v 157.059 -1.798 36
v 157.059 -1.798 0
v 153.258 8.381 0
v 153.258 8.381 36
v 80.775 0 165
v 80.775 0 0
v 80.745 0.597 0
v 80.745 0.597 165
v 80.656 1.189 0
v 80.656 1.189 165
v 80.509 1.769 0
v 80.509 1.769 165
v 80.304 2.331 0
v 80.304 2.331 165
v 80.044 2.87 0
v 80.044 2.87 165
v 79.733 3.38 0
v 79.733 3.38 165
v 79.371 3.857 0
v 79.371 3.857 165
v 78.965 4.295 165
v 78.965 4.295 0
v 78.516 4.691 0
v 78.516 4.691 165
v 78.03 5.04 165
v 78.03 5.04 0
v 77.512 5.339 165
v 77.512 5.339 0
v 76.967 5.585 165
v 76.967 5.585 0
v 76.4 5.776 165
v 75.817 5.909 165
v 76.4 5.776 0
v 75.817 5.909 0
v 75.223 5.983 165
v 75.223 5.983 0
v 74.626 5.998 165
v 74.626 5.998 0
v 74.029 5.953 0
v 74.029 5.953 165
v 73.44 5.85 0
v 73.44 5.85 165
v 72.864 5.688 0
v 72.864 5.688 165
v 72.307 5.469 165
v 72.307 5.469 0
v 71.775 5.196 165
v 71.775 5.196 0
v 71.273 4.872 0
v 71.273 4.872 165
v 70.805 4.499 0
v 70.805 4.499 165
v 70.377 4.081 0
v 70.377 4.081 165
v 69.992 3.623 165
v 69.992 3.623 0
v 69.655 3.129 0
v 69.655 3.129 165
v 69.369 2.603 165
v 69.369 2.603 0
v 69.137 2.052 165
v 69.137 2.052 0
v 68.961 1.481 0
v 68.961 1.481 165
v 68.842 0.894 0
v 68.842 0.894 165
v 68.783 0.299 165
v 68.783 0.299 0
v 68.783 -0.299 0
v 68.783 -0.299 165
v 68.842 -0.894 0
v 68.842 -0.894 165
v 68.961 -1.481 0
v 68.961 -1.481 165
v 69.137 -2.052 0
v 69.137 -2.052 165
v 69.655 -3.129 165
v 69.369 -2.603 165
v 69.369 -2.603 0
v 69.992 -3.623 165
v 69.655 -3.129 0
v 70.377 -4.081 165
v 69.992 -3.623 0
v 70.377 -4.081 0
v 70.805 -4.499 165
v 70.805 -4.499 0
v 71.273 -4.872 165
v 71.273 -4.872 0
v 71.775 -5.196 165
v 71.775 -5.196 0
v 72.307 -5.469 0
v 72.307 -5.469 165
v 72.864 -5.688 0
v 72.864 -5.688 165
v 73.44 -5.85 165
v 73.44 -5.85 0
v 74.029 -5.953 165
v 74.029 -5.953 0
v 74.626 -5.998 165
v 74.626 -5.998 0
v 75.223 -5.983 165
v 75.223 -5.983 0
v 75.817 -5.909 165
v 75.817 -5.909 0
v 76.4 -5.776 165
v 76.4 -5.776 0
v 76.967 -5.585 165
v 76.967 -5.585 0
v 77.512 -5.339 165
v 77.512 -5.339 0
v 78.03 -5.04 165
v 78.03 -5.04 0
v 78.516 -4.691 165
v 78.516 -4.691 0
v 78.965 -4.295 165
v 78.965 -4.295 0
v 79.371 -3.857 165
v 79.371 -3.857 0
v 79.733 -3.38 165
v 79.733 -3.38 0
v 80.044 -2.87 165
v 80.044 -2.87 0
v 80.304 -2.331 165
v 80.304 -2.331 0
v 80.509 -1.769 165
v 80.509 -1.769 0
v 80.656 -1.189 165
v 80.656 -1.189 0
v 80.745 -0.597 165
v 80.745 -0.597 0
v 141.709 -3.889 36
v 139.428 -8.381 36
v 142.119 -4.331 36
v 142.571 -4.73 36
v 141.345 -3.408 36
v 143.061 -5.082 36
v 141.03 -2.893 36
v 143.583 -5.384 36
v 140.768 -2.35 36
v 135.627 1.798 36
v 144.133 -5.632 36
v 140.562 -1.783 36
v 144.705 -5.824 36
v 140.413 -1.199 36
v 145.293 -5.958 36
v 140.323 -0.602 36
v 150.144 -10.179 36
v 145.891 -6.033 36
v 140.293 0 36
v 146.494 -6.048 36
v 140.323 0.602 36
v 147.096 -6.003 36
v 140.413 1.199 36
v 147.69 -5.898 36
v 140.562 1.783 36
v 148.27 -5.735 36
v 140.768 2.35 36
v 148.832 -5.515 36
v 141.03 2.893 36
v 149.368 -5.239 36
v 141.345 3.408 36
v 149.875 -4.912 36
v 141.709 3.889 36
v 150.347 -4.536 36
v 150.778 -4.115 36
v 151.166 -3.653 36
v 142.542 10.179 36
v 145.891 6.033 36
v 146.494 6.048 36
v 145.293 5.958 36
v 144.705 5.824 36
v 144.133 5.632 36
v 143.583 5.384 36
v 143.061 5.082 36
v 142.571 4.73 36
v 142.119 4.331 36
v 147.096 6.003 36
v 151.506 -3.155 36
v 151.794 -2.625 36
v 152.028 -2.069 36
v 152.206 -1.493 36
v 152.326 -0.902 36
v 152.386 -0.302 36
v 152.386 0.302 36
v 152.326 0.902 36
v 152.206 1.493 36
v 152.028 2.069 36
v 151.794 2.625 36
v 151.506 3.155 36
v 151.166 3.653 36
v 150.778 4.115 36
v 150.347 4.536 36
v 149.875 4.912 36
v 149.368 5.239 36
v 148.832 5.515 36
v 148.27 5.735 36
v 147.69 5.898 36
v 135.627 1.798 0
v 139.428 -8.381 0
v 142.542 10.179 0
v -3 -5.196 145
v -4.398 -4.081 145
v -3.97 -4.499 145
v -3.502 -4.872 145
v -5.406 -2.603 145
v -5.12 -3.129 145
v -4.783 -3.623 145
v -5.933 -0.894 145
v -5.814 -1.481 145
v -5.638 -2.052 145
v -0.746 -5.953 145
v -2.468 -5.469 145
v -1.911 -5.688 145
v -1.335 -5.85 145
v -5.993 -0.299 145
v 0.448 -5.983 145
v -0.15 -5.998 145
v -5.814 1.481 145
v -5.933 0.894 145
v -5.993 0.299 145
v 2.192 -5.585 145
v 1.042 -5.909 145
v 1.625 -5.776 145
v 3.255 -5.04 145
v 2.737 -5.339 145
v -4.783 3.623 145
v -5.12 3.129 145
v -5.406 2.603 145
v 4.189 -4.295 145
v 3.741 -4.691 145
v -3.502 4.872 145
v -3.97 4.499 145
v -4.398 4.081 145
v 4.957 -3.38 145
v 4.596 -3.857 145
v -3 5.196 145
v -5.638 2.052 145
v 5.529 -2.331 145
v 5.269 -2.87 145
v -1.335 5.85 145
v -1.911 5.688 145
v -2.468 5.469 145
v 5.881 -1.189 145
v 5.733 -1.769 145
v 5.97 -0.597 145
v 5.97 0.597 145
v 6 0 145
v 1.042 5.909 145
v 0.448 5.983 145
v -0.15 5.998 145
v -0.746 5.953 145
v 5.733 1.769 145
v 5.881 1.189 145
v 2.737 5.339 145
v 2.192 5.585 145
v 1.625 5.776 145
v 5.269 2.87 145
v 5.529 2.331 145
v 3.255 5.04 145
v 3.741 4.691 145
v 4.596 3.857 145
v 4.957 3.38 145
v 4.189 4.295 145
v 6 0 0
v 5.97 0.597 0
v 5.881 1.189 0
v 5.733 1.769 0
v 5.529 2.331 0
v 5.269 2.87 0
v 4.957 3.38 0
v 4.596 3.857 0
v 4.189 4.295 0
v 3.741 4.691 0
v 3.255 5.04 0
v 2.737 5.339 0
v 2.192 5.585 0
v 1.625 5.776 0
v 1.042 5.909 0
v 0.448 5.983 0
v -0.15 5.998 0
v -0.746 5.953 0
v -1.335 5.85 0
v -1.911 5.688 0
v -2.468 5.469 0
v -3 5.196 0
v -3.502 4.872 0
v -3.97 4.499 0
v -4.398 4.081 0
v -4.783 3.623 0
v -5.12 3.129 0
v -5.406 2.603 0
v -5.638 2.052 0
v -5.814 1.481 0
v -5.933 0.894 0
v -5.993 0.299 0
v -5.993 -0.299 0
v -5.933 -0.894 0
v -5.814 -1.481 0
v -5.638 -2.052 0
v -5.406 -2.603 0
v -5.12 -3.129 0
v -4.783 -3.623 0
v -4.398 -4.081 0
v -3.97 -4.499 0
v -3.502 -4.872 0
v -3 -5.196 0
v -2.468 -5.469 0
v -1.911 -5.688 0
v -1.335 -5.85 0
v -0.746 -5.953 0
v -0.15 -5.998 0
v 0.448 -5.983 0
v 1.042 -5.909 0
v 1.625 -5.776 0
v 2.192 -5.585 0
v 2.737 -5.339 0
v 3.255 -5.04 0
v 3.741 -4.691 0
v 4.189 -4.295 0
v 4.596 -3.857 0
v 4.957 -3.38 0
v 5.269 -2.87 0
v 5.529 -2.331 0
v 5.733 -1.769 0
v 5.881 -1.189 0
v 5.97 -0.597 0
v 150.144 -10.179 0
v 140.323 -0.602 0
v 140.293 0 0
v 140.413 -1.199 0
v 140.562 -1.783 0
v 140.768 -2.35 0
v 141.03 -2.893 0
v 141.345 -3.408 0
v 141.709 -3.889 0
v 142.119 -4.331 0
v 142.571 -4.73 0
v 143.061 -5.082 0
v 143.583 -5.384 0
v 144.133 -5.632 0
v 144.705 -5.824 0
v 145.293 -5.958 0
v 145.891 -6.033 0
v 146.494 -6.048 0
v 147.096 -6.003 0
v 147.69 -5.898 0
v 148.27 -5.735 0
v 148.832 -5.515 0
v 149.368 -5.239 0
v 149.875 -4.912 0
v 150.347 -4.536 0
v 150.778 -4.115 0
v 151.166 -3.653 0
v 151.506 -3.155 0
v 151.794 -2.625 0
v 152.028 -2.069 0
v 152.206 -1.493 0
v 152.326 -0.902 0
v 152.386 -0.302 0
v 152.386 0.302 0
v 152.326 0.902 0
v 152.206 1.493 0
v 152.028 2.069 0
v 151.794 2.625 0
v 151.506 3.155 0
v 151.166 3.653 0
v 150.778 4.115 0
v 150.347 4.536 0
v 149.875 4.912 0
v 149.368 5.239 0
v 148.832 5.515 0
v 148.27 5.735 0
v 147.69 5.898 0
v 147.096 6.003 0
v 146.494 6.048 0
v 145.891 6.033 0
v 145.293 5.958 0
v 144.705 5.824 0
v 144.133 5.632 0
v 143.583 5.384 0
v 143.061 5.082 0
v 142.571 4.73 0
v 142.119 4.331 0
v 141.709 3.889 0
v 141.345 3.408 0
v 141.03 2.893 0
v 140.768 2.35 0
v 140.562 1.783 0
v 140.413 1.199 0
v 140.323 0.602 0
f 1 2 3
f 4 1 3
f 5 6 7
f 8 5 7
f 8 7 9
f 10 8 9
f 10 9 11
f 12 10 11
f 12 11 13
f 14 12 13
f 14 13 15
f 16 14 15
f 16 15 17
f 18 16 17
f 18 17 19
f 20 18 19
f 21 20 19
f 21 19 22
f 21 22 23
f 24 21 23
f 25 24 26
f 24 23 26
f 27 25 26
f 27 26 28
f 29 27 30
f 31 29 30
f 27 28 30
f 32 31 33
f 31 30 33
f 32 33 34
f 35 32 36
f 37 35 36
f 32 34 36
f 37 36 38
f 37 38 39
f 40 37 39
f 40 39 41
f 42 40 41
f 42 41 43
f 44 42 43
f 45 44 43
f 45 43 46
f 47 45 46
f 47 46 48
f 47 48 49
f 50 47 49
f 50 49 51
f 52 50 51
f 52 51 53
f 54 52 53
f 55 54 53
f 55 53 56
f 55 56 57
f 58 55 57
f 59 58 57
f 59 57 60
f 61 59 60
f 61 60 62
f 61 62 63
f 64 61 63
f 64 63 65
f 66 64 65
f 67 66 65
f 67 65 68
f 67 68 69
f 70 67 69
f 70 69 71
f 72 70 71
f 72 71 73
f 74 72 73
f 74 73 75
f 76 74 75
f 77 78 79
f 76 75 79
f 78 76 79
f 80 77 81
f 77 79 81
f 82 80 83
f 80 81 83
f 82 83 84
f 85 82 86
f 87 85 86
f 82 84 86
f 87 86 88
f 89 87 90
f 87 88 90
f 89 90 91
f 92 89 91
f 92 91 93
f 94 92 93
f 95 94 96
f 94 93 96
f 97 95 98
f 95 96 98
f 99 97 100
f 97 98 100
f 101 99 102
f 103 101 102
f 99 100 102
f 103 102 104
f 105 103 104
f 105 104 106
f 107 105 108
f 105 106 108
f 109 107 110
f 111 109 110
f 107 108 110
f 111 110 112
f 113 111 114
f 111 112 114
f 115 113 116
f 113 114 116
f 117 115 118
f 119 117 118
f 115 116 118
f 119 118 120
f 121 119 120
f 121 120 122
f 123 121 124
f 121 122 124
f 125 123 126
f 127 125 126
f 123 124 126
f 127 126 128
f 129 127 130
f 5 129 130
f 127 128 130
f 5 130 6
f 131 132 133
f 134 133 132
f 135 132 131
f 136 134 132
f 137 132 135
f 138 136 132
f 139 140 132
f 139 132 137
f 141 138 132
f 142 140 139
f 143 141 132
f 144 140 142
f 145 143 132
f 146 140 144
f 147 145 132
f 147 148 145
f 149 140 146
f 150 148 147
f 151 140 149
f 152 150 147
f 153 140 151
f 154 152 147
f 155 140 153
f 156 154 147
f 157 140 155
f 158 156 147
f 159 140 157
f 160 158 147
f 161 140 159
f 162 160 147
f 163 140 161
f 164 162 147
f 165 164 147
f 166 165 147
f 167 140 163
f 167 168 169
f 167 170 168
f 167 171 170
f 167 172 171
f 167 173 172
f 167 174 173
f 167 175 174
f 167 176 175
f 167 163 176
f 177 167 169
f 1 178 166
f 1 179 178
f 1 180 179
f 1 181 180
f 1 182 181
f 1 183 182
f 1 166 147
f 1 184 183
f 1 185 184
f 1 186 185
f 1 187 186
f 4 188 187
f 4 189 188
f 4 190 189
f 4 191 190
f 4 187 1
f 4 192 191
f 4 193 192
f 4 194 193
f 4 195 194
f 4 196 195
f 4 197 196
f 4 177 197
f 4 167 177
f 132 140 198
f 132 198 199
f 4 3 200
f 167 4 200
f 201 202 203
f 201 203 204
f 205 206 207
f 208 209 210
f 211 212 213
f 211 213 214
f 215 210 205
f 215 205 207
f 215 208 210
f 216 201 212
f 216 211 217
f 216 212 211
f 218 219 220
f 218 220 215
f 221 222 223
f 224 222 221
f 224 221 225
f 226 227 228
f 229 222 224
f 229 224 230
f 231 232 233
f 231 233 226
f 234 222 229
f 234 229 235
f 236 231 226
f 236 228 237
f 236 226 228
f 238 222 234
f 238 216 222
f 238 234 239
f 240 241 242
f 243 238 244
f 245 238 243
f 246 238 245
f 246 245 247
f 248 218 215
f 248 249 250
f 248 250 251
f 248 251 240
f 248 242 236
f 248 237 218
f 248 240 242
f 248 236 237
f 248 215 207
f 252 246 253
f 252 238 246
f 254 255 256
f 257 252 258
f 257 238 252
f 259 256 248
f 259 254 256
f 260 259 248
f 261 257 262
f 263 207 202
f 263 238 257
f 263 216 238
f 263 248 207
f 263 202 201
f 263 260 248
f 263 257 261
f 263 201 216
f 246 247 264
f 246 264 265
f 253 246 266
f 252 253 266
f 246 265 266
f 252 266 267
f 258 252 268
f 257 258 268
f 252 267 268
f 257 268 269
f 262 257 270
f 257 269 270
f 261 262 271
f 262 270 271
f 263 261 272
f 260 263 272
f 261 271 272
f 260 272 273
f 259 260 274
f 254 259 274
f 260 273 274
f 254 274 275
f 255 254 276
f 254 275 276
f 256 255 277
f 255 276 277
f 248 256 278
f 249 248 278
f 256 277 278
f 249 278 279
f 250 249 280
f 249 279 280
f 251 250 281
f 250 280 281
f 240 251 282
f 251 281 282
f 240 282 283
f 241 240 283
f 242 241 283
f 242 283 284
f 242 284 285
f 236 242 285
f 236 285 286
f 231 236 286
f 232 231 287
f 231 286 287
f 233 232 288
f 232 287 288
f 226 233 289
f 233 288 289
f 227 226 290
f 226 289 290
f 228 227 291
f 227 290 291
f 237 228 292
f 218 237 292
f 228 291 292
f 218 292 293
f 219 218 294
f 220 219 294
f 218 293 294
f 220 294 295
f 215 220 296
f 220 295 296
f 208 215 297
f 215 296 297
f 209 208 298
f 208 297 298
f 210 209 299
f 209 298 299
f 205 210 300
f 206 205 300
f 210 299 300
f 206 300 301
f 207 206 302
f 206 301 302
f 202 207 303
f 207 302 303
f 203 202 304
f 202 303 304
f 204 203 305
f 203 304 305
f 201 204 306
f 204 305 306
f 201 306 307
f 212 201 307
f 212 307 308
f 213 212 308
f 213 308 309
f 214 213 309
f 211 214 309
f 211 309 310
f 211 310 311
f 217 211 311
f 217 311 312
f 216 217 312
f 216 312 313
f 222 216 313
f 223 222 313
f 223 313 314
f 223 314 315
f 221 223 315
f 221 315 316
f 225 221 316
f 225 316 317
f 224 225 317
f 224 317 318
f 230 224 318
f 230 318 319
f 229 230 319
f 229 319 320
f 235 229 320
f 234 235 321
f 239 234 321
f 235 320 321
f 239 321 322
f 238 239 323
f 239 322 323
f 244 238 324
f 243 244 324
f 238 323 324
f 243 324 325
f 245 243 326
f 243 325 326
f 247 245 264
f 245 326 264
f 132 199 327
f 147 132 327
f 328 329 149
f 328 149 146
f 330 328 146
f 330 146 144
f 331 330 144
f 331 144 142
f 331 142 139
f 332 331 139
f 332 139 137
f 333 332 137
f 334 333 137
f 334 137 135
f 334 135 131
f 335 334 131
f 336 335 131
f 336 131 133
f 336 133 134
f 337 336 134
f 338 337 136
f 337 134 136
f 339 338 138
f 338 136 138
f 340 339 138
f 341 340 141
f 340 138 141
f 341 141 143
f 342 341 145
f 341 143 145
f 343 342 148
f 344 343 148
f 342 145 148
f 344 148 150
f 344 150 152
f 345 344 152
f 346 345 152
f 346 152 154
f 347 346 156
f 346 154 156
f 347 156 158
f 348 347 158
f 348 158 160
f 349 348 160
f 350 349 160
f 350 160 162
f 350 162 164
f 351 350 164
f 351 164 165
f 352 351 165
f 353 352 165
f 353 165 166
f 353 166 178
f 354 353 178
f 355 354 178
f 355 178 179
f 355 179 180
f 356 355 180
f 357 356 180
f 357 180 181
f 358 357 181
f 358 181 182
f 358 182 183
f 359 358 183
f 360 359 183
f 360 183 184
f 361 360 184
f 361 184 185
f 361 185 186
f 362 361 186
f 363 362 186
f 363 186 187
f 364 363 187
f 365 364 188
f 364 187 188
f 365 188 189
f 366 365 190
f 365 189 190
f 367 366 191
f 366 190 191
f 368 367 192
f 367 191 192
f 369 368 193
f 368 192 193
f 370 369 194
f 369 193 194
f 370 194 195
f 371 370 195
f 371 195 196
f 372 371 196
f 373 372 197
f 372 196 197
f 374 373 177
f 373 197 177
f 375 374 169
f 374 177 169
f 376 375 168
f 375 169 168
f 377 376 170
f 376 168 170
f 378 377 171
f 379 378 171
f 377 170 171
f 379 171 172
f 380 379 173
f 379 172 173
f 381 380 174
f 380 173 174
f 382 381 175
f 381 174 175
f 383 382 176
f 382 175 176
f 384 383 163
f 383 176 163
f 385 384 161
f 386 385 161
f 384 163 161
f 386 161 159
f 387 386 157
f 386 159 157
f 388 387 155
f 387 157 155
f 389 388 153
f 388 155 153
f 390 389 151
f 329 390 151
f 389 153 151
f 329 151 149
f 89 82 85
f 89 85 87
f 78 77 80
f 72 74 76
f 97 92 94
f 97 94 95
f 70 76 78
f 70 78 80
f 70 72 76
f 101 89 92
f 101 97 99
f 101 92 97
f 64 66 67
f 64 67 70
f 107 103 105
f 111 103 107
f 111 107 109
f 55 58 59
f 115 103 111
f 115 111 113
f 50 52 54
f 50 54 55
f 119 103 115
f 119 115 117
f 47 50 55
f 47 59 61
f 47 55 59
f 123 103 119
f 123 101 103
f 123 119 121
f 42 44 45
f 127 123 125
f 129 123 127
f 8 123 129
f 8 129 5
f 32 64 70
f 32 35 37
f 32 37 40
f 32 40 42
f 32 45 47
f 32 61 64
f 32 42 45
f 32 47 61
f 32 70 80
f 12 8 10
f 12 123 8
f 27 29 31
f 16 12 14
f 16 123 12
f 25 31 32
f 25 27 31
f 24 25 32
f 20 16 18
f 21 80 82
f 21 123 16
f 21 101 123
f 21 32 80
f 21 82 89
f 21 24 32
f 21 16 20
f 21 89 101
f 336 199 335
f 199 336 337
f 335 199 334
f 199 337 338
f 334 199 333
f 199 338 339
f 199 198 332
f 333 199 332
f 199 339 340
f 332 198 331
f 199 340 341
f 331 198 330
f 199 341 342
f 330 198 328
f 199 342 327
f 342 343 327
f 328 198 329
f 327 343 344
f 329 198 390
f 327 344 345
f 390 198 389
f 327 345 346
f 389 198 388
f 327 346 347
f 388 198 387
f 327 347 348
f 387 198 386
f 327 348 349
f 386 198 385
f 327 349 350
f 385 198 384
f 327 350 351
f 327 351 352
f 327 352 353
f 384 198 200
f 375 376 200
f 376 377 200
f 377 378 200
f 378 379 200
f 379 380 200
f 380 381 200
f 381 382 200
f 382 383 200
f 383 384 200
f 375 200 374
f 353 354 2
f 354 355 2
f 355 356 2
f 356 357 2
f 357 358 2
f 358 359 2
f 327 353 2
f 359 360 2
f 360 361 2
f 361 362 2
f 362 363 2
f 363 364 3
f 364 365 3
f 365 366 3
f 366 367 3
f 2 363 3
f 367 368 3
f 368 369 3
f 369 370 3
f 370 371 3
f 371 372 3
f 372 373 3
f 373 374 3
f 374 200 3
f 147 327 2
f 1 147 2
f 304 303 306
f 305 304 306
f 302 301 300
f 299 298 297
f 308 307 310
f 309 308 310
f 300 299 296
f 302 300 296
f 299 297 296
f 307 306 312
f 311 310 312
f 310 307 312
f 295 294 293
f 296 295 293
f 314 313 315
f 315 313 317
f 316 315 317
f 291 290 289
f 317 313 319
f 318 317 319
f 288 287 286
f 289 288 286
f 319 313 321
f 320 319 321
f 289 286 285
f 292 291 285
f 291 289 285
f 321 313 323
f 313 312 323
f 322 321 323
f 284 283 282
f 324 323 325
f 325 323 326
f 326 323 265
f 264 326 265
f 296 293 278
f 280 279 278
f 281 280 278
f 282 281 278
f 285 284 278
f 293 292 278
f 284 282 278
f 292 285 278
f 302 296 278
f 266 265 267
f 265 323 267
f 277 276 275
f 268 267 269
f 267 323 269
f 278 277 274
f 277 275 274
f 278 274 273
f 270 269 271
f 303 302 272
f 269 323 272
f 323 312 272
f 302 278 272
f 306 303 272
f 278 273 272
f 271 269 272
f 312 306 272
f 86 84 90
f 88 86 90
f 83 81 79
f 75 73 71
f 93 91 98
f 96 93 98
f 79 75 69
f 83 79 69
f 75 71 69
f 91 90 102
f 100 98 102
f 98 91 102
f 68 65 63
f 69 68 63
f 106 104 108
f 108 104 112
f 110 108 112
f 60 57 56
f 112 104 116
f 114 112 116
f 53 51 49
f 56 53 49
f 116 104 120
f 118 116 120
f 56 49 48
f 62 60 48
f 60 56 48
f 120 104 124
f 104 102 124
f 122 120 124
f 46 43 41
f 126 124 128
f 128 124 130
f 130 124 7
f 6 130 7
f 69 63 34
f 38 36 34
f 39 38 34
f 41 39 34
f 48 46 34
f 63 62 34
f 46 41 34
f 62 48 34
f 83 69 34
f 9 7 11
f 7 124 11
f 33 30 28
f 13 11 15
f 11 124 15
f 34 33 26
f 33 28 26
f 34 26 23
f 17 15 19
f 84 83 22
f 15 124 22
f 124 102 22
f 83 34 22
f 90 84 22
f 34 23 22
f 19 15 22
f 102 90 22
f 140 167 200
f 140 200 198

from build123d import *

# Parameters (mm, degrees)
F0_R     = 6
F1_DEPTH = 165
F2_DEPTH = 145
F4_DEPTH = 36
F5_D     = 12.1


with BuildPart() as f1:
    # F0 (on Top) → F1 (new body)
    with BuildSketch(Plane.XY):
        with Locations((74.7751072049, 0)):
            Circle(F0_R)
    extrude(amount=F1_DEPTH)

    # F0 (on Top) → F2, piece 2 (join)
    with BuildSketch(Plane.XY):
        with Locations((74.7751072049, 0)):
            Circle(F0_R)
    extrude(amount=F2_DEPTH)


with BuildPart() as f2:
    # F0 (on Top) → F2 (new body)
    with BuildSketch(Plane.XY):
        Circle(F0_R)
    extrude(amount=F2_DEPTH)


with BuildPart() as f4:
    # F3 (on Top) → F4 (new body)
    with BuildSketch(Plane.XY):
        Polygon((157.0593070035, -1.7977121316), (153.2581781804, 8.3814603792), (142.5421917851, 10.1791725108), (135.6273342128, 1.7977121316), (139.4284630358, -8.3814603792), (150.1444494312, -10.1791725108), align=None)
    extrude(amount=F4_DEPTH)

    # F5 (through all)
    with Locations(Plane(origin=(0, 0, 0), x_dir=(1, 0, 0), z_dir=(0, 0, -1))):
        with Locations((146.3433206081, 0)):
            Hole(F5_D / 2)


solid = Compound([f1.part, f2.part, f4.part])
